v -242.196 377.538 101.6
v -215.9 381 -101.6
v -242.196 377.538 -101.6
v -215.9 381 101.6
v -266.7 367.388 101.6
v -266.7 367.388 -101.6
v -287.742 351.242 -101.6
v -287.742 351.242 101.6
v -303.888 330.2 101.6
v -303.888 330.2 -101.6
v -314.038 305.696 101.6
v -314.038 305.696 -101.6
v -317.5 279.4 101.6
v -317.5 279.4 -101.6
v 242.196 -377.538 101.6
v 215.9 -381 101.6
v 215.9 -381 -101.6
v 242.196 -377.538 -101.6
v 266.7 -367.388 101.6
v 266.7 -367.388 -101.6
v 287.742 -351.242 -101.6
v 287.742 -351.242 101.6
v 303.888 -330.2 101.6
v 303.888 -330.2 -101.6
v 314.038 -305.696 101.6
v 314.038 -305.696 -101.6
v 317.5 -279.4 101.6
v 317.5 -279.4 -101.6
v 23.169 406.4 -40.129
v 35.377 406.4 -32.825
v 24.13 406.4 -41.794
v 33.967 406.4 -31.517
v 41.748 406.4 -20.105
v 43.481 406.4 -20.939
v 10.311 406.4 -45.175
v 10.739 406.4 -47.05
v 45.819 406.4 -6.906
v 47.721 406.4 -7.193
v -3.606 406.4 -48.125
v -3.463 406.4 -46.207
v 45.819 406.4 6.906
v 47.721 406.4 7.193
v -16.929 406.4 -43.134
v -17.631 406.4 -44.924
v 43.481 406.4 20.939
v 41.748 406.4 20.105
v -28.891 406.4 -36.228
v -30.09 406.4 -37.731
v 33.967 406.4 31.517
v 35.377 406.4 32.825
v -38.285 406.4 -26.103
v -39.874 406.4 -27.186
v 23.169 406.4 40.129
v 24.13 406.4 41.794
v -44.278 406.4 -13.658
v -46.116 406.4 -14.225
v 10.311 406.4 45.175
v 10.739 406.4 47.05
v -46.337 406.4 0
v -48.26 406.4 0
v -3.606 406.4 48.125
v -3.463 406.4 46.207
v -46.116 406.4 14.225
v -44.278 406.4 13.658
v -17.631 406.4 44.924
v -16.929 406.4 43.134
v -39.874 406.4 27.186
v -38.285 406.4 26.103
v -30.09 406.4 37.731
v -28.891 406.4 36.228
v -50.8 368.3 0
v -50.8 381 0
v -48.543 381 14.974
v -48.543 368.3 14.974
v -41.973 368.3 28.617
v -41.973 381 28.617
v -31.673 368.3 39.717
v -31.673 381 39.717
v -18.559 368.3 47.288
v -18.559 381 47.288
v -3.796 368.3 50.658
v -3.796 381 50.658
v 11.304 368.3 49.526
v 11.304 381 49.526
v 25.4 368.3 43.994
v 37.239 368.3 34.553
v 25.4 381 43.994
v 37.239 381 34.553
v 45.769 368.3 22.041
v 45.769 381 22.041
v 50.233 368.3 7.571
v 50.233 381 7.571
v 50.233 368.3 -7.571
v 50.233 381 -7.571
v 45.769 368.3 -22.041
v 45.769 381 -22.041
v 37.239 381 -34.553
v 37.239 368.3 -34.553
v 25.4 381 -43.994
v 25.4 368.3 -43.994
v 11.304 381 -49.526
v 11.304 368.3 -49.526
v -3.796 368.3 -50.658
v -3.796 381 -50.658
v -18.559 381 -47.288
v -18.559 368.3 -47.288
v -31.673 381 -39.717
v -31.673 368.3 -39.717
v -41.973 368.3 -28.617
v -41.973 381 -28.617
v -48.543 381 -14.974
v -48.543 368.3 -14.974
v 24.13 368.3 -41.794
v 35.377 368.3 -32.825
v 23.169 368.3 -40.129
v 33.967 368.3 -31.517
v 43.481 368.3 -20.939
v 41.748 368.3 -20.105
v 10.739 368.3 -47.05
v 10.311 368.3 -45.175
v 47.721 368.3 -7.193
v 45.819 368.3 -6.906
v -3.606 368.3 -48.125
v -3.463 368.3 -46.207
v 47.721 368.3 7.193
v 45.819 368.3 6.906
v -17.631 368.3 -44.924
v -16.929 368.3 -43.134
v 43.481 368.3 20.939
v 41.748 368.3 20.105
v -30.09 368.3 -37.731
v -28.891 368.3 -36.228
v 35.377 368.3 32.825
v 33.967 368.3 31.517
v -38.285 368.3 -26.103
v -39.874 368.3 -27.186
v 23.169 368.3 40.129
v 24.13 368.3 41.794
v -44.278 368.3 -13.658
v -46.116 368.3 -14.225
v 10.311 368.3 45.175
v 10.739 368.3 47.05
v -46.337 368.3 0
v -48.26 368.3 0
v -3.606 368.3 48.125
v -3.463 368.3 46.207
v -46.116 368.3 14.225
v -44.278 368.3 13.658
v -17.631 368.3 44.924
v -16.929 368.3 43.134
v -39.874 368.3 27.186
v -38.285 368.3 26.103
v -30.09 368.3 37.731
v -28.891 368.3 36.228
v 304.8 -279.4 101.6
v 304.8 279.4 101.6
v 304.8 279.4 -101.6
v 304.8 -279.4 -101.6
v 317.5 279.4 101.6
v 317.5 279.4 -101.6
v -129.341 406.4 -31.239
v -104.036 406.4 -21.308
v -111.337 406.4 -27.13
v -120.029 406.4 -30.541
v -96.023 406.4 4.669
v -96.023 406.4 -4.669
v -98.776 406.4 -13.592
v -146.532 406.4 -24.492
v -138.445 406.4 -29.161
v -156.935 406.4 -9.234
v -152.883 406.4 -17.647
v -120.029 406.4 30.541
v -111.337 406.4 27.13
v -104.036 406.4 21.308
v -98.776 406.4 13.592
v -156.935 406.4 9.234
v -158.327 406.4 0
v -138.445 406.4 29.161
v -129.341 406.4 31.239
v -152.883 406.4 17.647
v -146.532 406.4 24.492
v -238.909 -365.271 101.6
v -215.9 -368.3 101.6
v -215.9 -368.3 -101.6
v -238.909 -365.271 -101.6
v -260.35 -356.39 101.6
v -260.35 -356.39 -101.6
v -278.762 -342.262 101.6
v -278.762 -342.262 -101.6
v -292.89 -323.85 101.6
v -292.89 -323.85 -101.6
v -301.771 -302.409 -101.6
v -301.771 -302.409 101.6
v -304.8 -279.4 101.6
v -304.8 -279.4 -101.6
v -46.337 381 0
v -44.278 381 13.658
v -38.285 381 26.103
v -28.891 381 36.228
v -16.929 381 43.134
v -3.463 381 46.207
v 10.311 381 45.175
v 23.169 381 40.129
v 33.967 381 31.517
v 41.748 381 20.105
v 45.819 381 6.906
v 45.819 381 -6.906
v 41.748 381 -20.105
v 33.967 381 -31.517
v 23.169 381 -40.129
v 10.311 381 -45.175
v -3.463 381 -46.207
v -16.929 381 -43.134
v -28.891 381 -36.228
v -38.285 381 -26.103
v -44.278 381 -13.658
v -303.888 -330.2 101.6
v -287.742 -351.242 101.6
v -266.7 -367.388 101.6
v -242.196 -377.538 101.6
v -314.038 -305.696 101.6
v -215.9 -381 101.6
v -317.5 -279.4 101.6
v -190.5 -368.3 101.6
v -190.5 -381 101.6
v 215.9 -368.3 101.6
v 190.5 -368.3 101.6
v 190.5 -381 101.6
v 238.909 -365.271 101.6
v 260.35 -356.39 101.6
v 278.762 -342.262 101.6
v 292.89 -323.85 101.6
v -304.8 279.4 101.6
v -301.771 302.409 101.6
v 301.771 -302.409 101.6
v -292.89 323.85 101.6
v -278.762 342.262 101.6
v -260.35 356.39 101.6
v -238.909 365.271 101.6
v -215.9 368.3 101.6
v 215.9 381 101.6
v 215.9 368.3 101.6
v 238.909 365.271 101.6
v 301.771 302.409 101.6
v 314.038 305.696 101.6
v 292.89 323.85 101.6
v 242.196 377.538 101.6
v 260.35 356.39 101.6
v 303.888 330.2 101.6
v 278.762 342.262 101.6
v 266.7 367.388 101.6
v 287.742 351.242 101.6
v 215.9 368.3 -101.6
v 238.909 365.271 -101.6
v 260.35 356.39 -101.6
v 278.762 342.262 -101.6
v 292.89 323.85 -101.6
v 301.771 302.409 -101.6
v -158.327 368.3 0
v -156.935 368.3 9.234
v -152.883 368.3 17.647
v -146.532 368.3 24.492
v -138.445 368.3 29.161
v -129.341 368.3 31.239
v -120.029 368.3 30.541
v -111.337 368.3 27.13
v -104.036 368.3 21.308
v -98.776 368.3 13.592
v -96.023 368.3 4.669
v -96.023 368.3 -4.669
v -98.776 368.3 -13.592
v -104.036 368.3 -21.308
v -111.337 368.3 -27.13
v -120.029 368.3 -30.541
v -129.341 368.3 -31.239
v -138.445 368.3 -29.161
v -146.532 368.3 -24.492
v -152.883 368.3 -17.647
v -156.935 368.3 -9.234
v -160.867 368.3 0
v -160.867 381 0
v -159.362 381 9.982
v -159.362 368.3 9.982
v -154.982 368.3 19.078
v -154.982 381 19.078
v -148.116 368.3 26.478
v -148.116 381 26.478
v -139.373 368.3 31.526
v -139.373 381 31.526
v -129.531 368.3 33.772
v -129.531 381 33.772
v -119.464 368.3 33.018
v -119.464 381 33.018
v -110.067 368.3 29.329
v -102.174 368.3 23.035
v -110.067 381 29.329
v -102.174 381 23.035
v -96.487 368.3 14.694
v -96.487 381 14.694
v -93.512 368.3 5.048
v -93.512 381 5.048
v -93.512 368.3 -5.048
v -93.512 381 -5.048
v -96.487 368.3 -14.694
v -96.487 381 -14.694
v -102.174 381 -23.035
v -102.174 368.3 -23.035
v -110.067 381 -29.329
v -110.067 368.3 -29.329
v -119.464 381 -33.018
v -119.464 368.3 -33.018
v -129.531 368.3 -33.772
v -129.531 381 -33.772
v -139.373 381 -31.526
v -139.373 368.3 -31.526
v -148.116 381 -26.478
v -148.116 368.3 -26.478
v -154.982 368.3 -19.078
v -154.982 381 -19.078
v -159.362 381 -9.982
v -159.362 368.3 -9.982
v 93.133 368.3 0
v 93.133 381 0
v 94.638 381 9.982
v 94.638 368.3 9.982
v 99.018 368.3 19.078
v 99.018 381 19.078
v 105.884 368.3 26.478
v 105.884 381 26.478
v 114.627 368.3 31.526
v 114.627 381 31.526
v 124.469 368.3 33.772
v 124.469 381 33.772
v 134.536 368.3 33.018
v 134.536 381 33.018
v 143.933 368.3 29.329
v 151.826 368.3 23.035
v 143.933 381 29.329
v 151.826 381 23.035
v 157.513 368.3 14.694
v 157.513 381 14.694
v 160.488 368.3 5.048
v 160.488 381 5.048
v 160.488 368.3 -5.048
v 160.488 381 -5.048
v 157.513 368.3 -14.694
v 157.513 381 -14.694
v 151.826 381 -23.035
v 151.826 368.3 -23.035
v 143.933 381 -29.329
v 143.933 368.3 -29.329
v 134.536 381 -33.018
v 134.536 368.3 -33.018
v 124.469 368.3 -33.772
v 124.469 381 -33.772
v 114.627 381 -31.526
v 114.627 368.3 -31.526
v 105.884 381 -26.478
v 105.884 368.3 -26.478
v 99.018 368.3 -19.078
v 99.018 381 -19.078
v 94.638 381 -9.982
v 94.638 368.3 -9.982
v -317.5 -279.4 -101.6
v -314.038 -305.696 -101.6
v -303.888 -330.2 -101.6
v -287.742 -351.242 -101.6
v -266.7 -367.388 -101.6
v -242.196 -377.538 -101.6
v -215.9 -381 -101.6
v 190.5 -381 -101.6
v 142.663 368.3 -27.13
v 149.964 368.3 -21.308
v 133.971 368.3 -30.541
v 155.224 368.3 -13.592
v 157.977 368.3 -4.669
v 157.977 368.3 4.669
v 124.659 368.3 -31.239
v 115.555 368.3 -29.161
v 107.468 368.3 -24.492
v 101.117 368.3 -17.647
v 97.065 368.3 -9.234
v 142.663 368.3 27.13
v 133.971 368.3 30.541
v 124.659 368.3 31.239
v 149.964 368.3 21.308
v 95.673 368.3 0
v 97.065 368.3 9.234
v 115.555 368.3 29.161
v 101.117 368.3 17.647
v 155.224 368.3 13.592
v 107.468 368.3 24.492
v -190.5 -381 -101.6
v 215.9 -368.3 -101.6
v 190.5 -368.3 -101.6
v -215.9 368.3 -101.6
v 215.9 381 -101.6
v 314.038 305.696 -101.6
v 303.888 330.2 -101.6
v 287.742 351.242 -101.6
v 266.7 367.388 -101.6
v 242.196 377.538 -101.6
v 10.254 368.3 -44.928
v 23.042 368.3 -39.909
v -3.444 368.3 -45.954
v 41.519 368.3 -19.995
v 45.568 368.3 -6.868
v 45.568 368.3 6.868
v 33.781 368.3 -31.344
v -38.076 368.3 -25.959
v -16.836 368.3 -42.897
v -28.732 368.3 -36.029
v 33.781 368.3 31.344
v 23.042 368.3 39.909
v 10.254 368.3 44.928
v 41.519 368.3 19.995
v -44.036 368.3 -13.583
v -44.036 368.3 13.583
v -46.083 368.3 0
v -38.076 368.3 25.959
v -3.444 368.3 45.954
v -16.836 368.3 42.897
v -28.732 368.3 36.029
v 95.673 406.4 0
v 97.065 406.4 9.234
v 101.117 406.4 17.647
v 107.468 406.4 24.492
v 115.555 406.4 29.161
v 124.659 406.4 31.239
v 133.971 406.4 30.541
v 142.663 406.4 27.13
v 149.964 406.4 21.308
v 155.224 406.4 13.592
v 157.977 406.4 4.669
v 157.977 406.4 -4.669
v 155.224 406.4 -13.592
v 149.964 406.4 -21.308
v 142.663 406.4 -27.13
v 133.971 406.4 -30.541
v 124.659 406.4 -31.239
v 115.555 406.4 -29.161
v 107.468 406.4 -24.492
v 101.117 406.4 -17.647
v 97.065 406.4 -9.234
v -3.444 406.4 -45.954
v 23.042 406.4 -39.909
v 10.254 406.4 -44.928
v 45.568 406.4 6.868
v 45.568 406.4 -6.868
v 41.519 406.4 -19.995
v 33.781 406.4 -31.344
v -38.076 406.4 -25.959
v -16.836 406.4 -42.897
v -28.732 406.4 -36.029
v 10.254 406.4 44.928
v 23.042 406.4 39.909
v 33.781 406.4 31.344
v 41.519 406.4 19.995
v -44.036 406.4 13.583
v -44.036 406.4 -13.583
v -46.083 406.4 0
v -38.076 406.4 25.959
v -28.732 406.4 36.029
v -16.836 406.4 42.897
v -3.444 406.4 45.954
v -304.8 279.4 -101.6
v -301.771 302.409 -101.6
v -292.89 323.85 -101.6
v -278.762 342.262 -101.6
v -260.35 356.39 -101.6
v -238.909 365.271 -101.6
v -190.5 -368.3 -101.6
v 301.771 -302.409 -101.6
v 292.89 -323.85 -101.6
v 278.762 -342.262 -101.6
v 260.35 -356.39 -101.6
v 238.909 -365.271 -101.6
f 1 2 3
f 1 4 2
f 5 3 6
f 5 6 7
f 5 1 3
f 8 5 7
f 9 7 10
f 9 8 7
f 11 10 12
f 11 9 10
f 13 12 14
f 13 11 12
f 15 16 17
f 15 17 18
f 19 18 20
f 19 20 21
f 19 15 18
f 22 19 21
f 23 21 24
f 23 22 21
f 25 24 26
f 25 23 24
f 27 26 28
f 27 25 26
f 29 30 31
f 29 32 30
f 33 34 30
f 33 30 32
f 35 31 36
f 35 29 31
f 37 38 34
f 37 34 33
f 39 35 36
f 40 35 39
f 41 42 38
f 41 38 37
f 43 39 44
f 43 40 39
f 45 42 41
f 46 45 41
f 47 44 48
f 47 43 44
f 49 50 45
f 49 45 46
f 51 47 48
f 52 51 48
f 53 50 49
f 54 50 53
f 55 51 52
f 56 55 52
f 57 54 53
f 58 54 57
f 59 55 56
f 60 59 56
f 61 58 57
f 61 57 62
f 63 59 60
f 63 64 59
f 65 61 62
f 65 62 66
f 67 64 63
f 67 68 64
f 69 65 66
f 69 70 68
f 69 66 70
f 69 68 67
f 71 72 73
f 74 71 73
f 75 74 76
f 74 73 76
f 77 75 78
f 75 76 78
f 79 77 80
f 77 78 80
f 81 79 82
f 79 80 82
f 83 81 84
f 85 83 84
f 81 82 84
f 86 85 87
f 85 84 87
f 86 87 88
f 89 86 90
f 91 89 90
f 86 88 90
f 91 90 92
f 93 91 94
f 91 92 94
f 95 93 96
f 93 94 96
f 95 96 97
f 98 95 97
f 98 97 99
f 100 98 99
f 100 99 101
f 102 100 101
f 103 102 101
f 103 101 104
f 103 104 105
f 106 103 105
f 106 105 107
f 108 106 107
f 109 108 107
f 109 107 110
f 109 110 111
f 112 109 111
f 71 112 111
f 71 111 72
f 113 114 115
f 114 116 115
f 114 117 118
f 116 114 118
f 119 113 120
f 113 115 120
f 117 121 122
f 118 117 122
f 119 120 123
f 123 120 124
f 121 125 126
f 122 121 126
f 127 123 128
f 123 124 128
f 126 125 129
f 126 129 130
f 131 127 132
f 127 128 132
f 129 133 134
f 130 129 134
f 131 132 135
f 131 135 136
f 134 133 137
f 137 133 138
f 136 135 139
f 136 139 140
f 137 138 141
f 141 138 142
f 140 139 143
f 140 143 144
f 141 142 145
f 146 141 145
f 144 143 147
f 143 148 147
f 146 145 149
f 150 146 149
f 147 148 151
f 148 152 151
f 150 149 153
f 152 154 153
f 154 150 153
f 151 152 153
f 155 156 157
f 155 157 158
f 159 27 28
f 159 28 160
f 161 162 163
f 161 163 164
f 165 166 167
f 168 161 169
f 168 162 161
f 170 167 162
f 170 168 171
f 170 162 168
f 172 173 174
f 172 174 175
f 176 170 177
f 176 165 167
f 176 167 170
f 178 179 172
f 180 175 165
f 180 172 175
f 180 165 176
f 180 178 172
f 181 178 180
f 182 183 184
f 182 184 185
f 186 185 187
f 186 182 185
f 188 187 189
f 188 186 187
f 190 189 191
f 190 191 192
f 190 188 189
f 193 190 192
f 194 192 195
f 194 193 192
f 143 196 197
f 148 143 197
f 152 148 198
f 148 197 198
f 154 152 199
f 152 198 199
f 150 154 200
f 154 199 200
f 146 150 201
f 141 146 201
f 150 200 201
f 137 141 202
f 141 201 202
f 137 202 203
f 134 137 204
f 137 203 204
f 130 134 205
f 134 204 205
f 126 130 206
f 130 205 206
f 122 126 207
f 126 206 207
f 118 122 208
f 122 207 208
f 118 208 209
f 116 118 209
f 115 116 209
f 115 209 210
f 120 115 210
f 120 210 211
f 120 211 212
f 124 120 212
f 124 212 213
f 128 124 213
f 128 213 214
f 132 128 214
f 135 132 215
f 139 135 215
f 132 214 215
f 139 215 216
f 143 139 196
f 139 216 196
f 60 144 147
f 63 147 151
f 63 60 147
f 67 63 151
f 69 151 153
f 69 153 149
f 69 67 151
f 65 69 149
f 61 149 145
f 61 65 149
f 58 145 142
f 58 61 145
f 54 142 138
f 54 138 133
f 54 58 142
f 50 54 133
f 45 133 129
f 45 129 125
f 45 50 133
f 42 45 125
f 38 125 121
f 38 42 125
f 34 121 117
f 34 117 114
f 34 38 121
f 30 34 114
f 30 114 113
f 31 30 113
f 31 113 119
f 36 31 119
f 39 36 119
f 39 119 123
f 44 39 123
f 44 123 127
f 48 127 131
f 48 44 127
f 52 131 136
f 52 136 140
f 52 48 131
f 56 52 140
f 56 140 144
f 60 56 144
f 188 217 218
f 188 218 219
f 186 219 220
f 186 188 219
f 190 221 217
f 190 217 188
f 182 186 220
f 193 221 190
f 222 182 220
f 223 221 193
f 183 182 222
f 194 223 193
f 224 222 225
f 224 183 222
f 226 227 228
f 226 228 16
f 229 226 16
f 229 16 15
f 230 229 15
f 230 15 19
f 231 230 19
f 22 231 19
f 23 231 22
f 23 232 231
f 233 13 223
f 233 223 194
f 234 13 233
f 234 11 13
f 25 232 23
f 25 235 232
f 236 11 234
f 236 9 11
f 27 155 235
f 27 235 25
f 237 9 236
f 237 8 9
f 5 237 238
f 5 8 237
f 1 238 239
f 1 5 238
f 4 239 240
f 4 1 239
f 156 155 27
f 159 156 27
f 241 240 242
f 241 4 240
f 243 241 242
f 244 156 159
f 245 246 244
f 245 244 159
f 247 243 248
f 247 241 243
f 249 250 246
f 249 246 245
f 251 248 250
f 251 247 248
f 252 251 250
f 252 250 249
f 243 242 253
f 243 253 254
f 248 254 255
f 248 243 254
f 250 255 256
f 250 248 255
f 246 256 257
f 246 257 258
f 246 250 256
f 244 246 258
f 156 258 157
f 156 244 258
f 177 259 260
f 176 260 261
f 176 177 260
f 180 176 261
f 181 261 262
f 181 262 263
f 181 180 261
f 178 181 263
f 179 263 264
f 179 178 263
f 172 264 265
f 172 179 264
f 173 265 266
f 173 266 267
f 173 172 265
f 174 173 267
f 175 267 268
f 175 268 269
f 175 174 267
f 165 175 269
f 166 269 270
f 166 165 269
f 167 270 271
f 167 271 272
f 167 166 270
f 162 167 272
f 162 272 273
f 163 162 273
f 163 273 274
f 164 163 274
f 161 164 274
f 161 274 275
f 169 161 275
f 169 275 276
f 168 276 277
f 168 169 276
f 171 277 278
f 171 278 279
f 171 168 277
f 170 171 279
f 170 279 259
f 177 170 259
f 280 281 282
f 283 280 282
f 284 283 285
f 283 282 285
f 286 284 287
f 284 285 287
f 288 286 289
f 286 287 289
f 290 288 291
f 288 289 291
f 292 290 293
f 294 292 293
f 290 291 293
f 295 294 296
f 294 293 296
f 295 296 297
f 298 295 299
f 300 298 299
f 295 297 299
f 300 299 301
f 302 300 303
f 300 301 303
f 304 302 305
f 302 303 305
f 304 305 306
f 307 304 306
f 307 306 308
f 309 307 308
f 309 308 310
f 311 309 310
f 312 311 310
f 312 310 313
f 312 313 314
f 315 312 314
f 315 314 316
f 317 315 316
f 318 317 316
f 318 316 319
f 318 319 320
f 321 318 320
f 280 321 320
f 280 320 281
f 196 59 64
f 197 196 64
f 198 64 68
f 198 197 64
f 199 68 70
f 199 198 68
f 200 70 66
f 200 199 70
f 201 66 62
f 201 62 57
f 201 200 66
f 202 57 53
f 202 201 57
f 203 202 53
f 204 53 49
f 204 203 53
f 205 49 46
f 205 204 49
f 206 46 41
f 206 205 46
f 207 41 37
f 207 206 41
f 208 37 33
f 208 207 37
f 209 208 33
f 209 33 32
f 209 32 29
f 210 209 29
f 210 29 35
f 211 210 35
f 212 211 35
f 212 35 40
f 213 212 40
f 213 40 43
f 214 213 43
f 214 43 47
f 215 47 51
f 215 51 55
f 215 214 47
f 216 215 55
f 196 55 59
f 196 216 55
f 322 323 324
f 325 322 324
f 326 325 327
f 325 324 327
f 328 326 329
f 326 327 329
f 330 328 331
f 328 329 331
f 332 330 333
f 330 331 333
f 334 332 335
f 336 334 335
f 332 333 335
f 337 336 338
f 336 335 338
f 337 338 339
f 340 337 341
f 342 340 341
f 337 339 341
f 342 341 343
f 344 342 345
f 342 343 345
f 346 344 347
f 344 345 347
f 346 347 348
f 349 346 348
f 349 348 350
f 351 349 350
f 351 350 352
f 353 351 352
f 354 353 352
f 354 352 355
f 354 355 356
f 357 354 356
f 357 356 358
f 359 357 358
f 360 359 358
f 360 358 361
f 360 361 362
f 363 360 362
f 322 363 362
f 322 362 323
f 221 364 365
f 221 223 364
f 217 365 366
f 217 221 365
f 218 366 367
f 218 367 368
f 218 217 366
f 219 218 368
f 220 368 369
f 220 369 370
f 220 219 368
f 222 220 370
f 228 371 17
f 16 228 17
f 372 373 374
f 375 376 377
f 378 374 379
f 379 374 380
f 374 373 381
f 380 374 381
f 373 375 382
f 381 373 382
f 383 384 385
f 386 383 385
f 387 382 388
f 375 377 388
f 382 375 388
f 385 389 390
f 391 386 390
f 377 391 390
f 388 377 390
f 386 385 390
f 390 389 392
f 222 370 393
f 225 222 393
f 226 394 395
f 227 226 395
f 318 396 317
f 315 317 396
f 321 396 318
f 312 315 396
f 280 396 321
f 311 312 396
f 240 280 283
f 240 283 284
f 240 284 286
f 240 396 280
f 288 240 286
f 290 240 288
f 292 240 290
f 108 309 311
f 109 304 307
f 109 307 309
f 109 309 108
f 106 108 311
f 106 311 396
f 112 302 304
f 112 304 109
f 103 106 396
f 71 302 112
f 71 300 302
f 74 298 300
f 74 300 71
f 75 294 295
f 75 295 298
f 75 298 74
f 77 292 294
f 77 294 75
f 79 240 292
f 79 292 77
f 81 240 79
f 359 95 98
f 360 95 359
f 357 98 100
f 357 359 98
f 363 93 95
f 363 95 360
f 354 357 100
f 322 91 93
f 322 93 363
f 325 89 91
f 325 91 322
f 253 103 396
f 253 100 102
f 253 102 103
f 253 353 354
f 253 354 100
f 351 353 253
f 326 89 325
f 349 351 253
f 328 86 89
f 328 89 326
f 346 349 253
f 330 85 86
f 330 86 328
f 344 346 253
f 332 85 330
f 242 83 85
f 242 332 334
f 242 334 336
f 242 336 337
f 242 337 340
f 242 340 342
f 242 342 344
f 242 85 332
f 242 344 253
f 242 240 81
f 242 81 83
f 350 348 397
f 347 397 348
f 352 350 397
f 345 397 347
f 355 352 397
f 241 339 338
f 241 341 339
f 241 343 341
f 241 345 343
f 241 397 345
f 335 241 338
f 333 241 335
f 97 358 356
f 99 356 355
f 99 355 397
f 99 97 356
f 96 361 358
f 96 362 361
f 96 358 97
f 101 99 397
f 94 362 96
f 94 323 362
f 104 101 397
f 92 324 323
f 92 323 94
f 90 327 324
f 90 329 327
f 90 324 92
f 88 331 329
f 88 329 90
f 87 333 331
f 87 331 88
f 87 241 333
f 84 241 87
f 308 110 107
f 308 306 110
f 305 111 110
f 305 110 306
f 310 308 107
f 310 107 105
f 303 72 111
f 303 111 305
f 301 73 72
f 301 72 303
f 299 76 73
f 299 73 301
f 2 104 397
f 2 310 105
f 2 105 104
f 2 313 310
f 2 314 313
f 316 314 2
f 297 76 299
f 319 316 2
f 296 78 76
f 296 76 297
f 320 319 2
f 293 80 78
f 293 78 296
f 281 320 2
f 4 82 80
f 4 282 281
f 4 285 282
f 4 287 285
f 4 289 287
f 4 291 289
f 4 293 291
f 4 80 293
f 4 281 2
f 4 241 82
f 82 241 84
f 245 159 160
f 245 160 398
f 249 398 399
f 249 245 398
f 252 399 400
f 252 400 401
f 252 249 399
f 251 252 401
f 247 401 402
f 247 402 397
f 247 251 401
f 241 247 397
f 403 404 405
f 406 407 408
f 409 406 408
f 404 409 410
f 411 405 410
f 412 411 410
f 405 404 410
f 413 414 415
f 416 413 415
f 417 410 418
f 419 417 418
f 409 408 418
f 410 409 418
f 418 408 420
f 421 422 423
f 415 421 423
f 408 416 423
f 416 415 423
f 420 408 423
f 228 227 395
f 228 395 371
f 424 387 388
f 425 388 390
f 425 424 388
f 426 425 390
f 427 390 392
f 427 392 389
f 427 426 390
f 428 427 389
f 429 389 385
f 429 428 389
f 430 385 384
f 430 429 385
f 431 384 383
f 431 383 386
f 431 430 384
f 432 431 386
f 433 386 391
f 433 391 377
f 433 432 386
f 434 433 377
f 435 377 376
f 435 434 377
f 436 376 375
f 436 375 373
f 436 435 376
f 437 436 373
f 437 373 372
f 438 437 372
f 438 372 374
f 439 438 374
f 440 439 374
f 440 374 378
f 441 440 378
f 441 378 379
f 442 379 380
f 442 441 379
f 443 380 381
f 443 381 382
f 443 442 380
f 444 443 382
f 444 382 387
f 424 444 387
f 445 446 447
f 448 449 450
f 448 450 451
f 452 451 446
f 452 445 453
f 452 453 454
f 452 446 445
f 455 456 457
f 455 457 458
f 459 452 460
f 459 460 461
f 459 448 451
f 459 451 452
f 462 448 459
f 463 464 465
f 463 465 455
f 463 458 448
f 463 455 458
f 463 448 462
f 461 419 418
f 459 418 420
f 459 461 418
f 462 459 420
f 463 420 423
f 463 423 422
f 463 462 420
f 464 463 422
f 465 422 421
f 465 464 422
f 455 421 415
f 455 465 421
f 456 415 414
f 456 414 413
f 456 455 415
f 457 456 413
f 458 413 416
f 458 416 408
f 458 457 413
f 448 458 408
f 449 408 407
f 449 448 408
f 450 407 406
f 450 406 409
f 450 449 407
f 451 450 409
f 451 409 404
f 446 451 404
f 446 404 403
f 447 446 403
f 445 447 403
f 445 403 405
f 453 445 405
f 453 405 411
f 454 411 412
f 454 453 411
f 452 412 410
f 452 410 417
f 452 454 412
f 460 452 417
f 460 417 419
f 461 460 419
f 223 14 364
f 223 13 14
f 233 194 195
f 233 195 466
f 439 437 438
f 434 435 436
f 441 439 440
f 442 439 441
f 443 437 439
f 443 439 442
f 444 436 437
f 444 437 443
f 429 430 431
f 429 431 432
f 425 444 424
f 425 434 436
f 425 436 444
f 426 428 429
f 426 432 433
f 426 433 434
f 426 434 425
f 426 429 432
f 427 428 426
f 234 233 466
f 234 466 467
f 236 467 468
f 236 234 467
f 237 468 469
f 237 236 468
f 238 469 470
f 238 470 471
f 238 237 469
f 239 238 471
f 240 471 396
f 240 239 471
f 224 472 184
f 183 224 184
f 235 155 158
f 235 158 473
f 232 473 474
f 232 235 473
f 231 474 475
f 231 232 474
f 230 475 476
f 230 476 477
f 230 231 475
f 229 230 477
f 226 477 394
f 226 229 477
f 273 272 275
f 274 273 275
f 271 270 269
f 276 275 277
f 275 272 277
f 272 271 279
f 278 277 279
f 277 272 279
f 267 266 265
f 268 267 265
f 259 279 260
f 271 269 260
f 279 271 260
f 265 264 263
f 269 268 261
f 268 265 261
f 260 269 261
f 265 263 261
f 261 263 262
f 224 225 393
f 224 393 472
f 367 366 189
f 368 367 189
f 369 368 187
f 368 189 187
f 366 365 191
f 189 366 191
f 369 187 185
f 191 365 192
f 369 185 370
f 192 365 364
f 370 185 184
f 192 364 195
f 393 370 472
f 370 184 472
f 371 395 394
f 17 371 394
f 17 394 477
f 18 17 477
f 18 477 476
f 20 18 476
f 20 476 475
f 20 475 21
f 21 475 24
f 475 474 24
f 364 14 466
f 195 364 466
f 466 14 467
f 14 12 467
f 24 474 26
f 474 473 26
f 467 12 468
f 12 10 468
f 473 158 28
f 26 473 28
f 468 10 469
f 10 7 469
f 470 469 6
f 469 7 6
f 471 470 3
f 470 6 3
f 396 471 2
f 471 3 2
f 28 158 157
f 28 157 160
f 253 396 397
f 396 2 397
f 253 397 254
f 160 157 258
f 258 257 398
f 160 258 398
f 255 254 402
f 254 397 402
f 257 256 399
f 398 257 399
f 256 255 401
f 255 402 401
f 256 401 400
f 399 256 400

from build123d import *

# Parameters (mm, degrees)
F1_DEPTH      = 101.6
F1_DEPTH_BACK = 101.6
F2_R          = 50.8
F2_R_2        = 33.866667
F3_DEPTH      = 25.4
F4_R          = 48.26
F4_R_2        = 46.337026
F4_R_3        = 31.326667
F5_DEPTH      = 25.4
F5_DEPTH_BACK = 12.7
F6_R          = 46.083026
F7_DEPTH      = 25.4
F7_DEPTH_BACK = 12.7


with BuildPart() as f1:
    # F0 (on Top) → F1 (new body, two sides)
    with BuildSketch(Plane.XY) as f1_sk:
        with BuildLine():
            ThreePointArc((-317.5, -279.4), (-287.742049, -351.242049), (-215.9, -381))
            Line((-215.9, -381), (-190.5, -381))
            Line((-190.5, -381), (-190.5, -368.3))
            Line((-190.5, -368.3), (-215.9, -368.3))
            ThreePointArc((-215.9, -368.3), (-278.761793, -342.261793), (-304.8, -279.4))
            Line((-304.8, -279.4), (-304.8, 279.4))
            ThreePointArc((-304.8, 279.4), (-278.761793, 342.261793), (-215.9, 368.3))
            Line((-215.9, 368.3), (215.9, 368.3))
            ThreePointArc((215.9, 368.3), (278.761793, 342.261793), (304.8, 279.4))
            Line((304.8, 279.4), (304.8, -279.4))
            ThreePointArc((304.8, -279.4), (278.761793, -342.261793), (215.9, -368.3))
            Line((215.9, -368.3), (190.5, -368.3))
            Line((190.5, -368.3), (190.5, -381))
            Line((190.5, -381), (215.9, -381))
            ThreePointArc((215.9, -381), (287.742049, -351.242049), (317.5, -279.4))
            Line((317.5, -279.4), (317.5, 279.4))
            ThreePointArc((317.5, 279.4), (287.742049, 351.242049), (215.9, 381))
            Line((215.9, 381), (-215.9, 381))
            ThreePointArc((-215.9, 381), (-287.742049, 351.242049), (-317.5, 279.4))
            Line((-317.5, 279.4), (-317.5, -279.4))
        make_face()
    extrude(amount=F1_DEPTH)
    extrude(f1_sk.sketch, amount=-F1_DEPTH_BACK)

    # F2 (on face) → F3 (cut)
    with BuildSketch(Plane(origin=(0, 381, 0), x_dir=(-1, 0, 0), z_dir=(0, 1, 0))):
        Circle(F2_R)
        with Locations((-127, 0)):
            Circle(F2_R_2)
        with Locations((127, 0)):
            Circle(F2_R_2)
    extrude(amount=-F3_DEPTH, mode=Mode.SUBTRACT)


with BuildPart() as f5:
    # F4 (on face) → F5 (new body, two sides)
    with BuildSketch(Plane(origin=(0, 381, 0), x_dir=(-1, 0, 0), z_dir=(0, 1, 0))) as f5_sk:
        Circle(F4_R)
        Circle(F4_R_2, mode=Mode.SUBTRACT)
        with Locations((-127, 0)):
            Circle(F4_R_3)
        with Locations((127, 0)):
            Circle(F4_R_3)
    extrude(amount=F5_DEPTH)
    extrude(f5_sk.sketch, amount=-F5_DEPTH_BACK)


with BuildPart() as f7:
    # F6 (on face) → F7 (new body, two sides)
    with BuildSketch(Plane(origin=(0, 381, 0), x_dir=(-1, 0, 0), z_dir=(0, 1, 0))) as f7_sk:
        Circle(F6_R)
    extrude(amount=F7_DEPTH)
    extrude(f7_sk.sketch, amount=-F7_DEPTH_BACK)


solid = Compound([f1.part, f5.part, f7.part])
